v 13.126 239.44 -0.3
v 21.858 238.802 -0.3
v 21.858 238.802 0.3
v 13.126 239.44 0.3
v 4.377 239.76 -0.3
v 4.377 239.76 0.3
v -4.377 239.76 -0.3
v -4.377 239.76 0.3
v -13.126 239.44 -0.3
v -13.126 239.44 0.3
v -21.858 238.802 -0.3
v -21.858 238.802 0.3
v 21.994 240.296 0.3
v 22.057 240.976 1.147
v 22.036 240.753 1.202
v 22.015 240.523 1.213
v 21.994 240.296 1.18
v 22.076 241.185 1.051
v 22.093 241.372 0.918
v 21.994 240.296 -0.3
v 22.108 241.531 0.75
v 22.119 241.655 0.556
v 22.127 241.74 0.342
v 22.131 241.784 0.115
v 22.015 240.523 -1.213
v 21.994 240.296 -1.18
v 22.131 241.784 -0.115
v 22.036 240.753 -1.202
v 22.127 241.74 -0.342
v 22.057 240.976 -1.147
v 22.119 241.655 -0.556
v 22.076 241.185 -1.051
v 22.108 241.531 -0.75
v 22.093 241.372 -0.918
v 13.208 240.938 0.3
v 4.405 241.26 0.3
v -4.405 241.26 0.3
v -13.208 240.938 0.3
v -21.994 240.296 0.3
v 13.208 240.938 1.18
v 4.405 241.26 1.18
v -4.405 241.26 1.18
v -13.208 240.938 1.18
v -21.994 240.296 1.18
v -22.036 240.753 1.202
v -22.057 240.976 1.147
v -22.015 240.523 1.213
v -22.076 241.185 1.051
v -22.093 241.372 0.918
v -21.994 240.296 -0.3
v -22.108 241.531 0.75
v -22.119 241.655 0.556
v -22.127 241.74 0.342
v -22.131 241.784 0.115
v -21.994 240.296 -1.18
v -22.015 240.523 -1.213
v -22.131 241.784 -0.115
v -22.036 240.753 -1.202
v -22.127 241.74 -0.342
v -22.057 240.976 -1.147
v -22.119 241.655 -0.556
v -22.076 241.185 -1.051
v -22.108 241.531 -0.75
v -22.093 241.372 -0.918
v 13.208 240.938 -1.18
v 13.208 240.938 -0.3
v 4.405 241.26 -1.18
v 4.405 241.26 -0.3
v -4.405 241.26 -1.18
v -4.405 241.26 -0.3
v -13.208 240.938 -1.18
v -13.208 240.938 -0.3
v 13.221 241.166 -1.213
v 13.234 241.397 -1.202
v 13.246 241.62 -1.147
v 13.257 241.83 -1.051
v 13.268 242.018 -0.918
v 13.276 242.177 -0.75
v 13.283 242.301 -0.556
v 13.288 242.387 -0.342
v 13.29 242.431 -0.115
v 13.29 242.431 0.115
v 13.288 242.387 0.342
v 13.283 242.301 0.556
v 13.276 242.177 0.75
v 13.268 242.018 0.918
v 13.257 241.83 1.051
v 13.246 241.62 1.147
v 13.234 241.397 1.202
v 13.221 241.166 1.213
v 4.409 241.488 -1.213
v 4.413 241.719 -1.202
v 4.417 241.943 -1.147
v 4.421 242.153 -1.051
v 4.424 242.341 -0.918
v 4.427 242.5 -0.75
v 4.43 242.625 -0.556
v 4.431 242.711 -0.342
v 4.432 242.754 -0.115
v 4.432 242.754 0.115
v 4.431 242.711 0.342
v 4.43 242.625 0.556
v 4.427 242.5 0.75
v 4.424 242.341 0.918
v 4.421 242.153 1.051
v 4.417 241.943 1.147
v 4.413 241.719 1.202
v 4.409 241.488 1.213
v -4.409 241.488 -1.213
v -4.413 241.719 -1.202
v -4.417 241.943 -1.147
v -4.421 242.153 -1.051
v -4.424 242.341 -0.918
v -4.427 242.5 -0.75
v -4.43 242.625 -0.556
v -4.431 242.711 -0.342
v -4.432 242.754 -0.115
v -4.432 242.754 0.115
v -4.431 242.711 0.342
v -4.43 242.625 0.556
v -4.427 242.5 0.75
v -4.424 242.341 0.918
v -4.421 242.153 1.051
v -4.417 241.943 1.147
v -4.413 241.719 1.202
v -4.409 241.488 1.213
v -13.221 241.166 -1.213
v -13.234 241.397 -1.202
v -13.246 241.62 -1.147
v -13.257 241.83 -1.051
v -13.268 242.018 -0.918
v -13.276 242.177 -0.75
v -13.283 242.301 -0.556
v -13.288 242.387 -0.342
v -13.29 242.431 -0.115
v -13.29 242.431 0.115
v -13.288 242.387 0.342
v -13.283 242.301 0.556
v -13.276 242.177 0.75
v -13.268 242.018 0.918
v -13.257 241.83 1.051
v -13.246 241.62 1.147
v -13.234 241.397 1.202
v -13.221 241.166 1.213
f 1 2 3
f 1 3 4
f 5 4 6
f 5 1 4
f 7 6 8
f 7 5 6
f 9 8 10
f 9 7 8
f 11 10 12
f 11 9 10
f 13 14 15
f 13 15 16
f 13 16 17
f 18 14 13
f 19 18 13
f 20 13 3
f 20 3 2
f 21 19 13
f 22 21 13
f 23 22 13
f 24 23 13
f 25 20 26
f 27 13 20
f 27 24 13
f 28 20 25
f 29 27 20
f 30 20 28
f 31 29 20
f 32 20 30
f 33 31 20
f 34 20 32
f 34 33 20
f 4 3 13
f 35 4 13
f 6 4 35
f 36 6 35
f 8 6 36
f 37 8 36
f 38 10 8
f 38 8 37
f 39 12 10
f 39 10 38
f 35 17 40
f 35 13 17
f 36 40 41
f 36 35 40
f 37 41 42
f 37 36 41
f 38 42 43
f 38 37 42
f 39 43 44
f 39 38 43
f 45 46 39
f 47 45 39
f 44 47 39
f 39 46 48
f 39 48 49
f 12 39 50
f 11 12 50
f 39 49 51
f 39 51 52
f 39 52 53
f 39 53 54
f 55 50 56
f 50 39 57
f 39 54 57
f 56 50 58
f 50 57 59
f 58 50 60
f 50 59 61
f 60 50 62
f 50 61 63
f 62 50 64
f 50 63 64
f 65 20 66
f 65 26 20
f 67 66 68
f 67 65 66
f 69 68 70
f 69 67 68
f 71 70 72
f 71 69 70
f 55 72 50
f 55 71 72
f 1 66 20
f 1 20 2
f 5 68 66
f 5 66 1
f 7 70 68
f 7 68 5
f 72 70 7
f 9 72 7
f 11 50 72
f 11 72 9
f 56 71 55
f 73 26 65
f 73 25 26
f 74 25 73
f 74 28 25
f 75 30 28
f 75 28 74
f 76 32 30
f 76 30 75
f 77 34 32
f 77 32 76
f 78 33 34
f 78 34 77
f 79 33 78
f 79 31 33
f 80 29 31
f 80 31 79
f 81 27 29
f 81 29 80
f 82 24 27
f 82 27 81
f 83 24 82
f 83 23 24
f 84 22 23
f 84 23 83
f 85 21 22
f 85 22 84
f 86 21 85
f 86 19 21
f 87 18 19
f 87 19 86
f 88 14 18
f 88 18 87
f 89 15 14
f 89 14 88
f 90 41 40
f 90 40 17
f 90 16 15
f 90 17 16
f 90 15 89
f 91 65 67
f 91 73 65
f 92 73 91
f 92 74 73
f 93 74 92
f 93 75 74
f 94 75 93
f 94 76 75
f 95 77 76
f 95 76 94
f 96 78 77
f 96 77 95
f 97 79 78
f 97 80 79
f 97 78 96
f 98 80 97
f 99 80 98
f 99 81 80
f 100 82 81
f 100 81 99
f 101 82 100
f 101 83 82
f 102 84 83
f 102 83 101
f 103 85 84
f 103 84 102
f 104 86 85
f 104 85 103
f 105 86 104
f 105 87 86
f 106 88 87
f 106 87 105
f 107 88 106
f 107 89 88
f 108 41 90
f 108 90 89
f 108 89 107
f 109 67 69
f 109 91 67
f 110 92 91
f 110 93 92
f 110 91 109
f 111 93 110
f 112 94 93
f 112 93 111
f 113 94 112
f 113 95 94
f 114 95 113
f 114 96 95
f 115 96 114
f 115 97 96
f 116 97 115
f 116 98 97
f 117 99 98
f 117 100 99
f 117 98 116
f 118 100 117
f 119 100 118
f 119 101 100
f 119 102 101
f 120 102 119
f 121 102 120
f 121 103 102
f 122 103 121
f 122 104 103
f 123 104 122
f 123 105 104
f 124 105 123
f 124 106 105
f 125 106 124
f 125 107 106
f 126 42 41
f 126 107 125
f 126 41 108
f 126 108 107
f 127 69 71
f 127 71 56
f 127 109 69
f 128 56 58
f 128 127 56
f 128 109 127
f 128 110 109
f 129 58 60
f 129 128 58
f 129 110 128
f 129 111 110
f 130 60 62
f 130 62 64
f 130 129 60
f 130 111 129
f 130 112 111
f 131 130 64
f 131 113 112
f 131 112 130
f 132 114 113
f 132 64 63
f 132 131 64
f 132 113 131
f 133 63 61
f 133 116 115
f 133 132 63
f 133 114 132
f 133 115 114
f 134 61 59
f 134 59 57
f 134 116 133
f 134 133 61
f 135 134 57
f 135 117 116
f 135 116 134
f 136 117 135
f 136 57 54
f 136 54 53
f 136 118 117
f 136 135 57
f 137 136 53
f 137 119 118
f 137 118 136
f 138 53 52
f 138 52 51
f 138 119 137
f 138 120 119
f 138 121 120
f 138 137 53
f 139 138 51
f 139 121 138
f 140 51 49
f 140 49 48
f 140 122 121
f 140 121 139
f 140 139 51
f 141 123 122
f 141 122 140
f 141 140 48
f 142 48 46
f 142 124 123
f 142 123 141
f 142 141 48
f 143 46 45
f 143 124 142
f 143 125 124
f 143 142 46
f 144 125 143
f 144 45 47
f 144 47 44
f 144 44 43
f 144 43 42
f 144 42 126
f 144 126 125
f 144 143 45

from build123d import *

# Parameters (mm, degrees)
REVOLVE1_ANGLE           = 5.229758018
REVOLVE1_OTHER_WAY_ANGLE = 5.229758018


with BuildPart() as part:
    # Sketch2 → Revolve1 (revolve)
    with BuildSketch(Plane(origin=(0, 0, 0), x_dir=(0, 0, -1), z_dir=(1, 0, 0))):
        with BuildLine():
            Line((0, 239.8), (0.3, 239.8))
            Line((0.3, 239.8), (0.3, 241.3))
            Line((0.3, 241.3), (1.18, 241.3))
            ThreePointArc((1.18, 241.3), (0, 242.800182019), (-1.18, 241.3))
            Line((-1.18, 241.3), (-0.3, 241.3))
            Line((-0.3, 241.3), (-0.3, 239.8))
            Line((-0.3, 239.8), (0, 239.8))
        make_face()
    revolve(axis=Axis((0, 0, 70.597641597), (0, 0, -1)), revolution_arc=REVOLVE1_ANGLE)

    # Sketch2 → Revolve1 other way (revolve)
    with BuildSketch(Plane(origin=(0, 0, 0), x_dir=(0, 0, -1), z_dir=(1, 0, 0))):
        with BuildLine():
            Line((0, 239.8), (0.3, 239.8))
            Line((0.3, 239.8), (0.3, 241.3))
            Line((0.3, 241.3), (1.18, 241.3))
            ThreePointArc((1.18, 241.3), (0, 242.800182019), (-1.18, 241.3))
            Line((-1.18, 241.3), (-0.3, 241.3))
            Line((-0.3, 241.3), (-0.3, 239.8))
            Line((-0.3, 239.8), (0, 239.8))
        make_face()
    revolve(axis=Axis((0, 0, 70.597641597), (0, 0, 1)), revolution_arc=REVOLVE1_OTHER_WAY_ANGLE)


solid = part.part
